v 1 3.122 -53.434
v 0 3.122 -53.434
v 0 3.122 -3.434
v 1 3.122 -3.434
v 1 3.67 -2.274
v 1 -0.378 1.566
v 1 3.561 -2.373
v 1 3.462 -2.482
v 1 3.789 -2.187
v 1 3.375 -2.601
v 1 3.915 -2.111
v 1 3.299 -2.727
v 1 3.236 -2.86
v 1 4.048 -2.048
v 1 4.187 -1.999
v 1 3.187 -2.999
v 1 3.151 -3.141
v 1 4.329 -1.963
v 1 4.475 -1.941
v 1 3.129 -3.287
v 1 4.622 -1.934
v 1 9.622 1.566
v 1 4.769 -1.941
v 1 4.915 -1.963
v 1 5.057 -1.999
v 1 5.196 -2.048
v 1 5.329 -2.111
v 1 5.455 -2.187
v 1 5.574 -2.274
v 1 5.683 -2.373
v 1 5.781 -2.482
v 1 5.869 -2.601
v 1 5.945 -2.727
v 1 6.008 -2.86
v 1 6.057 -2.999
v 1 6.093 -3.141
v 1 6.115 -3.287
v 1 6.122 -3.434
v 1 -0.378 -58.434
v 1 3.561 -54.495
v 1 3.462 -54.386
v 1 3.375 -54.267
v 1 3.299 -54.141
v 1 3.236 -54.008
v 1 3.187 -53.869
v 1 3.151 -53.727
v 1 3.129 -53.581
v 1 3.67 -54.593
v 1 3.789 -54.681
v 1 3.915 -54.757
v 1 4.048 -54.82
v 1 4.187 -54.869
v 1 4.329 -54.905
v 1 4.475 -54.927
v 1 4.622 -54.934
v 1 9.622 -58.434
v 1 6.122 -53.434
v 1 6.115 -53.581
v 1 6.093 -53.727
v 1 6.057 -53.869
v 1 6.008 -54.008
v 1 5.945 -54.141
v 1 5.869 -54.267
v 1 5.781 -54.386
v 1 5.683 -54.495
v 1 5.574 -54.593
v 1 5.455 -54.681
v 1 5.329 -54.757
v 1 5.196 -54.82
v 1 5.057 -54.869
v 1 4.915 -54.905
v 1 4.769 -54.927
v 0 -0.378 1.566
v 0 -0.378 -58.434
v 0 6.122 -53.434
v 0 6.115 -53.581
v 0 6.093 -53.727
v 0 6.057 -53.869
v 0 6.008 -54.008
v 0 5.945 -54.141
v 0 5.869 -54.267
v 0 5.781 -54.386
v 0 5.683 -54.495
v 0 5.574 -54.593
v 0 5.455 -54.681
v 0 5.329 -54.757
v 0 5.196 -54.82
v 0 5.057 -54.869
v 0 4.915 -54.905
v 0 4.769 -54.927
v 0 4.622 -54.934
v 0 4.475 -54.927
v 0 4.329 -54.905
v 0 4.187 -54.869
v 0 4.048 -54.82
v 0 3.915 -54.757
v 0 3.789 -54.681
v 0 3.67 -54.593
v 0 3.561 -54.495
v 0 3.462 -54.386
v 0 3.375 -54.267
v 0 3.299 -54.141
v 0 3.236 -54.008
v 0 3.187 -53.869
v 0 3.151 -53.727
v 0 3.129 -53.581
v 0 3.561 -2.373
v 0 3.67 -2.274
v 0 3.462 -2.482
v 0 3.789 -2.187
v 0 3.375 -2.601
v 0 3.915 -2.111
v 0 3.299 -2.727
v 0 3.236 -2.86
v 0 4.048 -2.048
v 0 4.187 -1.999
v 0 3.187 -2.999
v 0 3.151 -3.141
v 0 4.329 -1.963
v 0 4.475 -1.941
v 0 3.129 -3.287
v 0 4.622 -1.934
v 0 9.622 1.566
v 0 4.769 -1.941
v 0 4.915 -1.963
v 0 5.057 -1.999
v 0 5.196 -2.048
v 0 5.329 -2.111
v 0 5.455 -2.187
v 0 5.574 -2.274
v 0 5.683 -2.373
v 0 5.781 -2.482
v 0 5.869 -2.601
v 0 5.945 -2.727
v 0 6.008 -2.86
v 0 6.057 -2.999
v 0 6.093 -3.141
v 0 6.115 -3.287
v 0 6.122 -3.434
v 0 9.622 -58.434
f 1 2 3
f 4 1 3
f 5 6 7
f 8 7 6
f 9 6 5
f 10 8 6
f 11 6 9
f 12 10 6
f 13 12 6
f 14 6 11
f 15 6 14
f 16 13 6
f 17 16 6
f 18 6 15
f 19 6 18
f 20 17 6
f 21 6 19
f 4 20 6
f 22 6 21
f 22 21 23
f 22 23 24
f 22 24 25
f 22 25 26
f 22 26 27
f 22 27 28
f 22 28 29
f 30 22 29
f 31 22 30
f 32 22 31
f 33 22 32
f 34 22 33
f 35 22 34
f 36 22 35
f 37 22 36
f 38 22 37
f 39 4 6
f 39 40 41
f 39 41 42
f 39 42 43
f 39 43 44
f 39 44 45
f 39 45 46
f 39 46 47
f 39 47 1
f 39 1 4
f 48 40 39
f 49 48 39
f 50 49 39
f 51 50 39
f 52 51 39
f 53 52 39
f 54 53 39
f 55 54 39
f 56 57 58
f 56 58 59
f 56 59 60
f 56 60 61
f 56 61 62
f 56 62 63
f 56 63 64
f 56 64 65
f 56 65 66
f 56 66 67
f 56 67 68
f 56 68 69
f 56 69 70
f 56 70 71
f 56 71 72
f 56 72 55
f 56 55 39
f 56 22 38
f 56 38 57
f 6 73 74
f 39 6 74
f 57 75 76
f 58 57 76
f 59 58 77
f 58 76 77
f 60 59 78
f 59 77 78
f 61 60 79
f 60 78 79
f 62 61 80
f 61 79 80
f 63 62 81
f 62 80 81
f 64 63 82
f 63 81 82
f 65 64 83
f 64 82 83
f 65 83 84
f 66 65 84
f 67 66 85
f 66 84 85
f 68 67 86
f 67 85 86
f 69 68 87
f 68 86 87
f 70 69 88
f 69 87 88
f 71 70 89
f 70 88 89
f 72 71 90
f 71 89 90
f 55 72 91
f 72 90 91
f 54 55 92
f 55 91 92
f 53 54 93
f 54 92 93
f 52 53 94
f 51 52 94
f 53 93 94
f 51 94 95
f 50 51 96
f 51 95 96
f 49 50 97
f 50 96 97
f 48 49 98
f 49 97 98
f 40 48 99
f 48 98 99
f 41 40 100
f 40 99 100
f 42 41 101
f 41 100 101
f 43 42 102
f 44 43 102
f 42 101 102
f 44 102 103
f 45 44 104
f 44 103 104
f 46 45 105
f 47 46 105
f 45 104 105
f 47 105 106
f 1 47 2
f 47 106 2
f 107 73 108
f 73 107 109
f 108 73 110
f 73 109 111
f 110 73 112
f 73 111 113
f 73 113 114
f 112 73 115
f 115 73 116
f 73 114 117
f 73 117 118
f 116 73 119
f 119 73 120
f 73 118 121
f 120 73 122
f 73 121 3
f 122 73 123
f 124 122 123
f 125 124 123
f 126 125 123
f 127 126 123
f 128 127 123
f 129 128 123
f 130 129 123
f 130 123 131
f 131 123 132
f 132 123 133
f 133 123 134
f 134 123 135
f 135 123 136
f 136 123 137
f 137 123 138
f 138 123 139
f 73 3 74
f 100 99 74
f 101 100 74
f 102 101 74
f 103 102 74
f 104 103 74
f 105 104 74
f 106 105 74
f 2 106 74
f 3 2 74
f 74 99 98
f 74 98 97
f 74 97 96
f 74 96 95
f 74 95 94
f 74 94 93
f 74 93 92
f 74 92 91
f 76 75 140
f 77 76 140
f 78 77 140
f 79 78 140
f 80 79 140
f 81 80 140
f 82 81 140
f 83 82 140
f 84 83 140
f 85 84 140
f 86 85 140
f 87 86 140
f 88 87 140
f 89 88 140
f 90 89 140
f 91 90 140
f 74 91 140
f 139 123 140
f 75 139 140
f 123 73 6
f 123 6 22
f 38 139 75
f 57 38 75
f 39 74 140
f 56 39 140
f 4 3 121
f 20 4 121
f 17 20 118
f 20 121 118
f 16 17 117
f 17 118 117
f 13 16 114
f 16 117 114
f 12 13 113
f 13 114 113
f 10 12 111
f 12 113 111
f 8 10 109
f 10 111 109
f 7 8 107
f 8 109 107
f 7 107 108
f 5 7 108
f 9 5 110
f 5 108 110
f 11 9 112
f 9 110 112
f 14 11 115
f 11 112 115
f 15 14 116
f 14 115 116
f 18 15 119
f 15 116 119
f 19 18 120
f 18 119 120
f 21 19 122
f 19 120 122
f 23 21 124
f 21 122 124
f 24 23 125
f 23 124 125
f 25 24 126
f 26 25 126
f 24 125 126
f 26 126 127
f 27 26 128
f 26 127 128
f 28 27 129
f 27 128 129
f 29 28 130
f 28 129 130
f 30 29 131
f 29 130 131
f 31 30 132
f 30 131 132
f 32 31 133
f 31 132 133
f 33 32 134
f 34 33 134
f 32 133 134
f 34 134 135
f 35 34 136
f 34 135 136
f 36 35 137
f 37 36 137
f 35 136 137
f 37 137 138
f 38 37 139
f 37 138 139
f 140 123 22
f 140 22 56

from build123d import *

# Parameters (mm, degrees)
SKETCH_1_W      = 60
SKETCH_1_H      = 10
EXTRUDE_1_DEPTH = 1


with BuildPart() as part:
    # 草图1 → 凸台-拉伸1 (new body)
    with BuildSketch(Plane(origin=(0, 0, 0), x_dir=(0, 0, -1), z_dir=(1, 0, 0))):
        with Locations((28.433962264, 4.621952123)):
            Rectangle(SKETCH_1_W, SKETCH_1_H)
        with BuildLine():
            Line((3.433962264, 6.121952123), (53.433962264, 6.121952123))
            ThreePointArc((53.433962264, 6.121952123), (54.933962264, 4.621952123), (53.433962264, 3.121952123))
            Line((53.433962264, 3.121952123), (3.433962264, 3.121952123))
            ThreePointArc((3.433962264, 3.121952123), (1.933962264, 4.621952123), (3.433962264, 6.121952123))
        make_face(mode=Mode.SUBTRACT)
    extrude(amount=EXTRUDE_1_DEPTH)


solid = part.part
